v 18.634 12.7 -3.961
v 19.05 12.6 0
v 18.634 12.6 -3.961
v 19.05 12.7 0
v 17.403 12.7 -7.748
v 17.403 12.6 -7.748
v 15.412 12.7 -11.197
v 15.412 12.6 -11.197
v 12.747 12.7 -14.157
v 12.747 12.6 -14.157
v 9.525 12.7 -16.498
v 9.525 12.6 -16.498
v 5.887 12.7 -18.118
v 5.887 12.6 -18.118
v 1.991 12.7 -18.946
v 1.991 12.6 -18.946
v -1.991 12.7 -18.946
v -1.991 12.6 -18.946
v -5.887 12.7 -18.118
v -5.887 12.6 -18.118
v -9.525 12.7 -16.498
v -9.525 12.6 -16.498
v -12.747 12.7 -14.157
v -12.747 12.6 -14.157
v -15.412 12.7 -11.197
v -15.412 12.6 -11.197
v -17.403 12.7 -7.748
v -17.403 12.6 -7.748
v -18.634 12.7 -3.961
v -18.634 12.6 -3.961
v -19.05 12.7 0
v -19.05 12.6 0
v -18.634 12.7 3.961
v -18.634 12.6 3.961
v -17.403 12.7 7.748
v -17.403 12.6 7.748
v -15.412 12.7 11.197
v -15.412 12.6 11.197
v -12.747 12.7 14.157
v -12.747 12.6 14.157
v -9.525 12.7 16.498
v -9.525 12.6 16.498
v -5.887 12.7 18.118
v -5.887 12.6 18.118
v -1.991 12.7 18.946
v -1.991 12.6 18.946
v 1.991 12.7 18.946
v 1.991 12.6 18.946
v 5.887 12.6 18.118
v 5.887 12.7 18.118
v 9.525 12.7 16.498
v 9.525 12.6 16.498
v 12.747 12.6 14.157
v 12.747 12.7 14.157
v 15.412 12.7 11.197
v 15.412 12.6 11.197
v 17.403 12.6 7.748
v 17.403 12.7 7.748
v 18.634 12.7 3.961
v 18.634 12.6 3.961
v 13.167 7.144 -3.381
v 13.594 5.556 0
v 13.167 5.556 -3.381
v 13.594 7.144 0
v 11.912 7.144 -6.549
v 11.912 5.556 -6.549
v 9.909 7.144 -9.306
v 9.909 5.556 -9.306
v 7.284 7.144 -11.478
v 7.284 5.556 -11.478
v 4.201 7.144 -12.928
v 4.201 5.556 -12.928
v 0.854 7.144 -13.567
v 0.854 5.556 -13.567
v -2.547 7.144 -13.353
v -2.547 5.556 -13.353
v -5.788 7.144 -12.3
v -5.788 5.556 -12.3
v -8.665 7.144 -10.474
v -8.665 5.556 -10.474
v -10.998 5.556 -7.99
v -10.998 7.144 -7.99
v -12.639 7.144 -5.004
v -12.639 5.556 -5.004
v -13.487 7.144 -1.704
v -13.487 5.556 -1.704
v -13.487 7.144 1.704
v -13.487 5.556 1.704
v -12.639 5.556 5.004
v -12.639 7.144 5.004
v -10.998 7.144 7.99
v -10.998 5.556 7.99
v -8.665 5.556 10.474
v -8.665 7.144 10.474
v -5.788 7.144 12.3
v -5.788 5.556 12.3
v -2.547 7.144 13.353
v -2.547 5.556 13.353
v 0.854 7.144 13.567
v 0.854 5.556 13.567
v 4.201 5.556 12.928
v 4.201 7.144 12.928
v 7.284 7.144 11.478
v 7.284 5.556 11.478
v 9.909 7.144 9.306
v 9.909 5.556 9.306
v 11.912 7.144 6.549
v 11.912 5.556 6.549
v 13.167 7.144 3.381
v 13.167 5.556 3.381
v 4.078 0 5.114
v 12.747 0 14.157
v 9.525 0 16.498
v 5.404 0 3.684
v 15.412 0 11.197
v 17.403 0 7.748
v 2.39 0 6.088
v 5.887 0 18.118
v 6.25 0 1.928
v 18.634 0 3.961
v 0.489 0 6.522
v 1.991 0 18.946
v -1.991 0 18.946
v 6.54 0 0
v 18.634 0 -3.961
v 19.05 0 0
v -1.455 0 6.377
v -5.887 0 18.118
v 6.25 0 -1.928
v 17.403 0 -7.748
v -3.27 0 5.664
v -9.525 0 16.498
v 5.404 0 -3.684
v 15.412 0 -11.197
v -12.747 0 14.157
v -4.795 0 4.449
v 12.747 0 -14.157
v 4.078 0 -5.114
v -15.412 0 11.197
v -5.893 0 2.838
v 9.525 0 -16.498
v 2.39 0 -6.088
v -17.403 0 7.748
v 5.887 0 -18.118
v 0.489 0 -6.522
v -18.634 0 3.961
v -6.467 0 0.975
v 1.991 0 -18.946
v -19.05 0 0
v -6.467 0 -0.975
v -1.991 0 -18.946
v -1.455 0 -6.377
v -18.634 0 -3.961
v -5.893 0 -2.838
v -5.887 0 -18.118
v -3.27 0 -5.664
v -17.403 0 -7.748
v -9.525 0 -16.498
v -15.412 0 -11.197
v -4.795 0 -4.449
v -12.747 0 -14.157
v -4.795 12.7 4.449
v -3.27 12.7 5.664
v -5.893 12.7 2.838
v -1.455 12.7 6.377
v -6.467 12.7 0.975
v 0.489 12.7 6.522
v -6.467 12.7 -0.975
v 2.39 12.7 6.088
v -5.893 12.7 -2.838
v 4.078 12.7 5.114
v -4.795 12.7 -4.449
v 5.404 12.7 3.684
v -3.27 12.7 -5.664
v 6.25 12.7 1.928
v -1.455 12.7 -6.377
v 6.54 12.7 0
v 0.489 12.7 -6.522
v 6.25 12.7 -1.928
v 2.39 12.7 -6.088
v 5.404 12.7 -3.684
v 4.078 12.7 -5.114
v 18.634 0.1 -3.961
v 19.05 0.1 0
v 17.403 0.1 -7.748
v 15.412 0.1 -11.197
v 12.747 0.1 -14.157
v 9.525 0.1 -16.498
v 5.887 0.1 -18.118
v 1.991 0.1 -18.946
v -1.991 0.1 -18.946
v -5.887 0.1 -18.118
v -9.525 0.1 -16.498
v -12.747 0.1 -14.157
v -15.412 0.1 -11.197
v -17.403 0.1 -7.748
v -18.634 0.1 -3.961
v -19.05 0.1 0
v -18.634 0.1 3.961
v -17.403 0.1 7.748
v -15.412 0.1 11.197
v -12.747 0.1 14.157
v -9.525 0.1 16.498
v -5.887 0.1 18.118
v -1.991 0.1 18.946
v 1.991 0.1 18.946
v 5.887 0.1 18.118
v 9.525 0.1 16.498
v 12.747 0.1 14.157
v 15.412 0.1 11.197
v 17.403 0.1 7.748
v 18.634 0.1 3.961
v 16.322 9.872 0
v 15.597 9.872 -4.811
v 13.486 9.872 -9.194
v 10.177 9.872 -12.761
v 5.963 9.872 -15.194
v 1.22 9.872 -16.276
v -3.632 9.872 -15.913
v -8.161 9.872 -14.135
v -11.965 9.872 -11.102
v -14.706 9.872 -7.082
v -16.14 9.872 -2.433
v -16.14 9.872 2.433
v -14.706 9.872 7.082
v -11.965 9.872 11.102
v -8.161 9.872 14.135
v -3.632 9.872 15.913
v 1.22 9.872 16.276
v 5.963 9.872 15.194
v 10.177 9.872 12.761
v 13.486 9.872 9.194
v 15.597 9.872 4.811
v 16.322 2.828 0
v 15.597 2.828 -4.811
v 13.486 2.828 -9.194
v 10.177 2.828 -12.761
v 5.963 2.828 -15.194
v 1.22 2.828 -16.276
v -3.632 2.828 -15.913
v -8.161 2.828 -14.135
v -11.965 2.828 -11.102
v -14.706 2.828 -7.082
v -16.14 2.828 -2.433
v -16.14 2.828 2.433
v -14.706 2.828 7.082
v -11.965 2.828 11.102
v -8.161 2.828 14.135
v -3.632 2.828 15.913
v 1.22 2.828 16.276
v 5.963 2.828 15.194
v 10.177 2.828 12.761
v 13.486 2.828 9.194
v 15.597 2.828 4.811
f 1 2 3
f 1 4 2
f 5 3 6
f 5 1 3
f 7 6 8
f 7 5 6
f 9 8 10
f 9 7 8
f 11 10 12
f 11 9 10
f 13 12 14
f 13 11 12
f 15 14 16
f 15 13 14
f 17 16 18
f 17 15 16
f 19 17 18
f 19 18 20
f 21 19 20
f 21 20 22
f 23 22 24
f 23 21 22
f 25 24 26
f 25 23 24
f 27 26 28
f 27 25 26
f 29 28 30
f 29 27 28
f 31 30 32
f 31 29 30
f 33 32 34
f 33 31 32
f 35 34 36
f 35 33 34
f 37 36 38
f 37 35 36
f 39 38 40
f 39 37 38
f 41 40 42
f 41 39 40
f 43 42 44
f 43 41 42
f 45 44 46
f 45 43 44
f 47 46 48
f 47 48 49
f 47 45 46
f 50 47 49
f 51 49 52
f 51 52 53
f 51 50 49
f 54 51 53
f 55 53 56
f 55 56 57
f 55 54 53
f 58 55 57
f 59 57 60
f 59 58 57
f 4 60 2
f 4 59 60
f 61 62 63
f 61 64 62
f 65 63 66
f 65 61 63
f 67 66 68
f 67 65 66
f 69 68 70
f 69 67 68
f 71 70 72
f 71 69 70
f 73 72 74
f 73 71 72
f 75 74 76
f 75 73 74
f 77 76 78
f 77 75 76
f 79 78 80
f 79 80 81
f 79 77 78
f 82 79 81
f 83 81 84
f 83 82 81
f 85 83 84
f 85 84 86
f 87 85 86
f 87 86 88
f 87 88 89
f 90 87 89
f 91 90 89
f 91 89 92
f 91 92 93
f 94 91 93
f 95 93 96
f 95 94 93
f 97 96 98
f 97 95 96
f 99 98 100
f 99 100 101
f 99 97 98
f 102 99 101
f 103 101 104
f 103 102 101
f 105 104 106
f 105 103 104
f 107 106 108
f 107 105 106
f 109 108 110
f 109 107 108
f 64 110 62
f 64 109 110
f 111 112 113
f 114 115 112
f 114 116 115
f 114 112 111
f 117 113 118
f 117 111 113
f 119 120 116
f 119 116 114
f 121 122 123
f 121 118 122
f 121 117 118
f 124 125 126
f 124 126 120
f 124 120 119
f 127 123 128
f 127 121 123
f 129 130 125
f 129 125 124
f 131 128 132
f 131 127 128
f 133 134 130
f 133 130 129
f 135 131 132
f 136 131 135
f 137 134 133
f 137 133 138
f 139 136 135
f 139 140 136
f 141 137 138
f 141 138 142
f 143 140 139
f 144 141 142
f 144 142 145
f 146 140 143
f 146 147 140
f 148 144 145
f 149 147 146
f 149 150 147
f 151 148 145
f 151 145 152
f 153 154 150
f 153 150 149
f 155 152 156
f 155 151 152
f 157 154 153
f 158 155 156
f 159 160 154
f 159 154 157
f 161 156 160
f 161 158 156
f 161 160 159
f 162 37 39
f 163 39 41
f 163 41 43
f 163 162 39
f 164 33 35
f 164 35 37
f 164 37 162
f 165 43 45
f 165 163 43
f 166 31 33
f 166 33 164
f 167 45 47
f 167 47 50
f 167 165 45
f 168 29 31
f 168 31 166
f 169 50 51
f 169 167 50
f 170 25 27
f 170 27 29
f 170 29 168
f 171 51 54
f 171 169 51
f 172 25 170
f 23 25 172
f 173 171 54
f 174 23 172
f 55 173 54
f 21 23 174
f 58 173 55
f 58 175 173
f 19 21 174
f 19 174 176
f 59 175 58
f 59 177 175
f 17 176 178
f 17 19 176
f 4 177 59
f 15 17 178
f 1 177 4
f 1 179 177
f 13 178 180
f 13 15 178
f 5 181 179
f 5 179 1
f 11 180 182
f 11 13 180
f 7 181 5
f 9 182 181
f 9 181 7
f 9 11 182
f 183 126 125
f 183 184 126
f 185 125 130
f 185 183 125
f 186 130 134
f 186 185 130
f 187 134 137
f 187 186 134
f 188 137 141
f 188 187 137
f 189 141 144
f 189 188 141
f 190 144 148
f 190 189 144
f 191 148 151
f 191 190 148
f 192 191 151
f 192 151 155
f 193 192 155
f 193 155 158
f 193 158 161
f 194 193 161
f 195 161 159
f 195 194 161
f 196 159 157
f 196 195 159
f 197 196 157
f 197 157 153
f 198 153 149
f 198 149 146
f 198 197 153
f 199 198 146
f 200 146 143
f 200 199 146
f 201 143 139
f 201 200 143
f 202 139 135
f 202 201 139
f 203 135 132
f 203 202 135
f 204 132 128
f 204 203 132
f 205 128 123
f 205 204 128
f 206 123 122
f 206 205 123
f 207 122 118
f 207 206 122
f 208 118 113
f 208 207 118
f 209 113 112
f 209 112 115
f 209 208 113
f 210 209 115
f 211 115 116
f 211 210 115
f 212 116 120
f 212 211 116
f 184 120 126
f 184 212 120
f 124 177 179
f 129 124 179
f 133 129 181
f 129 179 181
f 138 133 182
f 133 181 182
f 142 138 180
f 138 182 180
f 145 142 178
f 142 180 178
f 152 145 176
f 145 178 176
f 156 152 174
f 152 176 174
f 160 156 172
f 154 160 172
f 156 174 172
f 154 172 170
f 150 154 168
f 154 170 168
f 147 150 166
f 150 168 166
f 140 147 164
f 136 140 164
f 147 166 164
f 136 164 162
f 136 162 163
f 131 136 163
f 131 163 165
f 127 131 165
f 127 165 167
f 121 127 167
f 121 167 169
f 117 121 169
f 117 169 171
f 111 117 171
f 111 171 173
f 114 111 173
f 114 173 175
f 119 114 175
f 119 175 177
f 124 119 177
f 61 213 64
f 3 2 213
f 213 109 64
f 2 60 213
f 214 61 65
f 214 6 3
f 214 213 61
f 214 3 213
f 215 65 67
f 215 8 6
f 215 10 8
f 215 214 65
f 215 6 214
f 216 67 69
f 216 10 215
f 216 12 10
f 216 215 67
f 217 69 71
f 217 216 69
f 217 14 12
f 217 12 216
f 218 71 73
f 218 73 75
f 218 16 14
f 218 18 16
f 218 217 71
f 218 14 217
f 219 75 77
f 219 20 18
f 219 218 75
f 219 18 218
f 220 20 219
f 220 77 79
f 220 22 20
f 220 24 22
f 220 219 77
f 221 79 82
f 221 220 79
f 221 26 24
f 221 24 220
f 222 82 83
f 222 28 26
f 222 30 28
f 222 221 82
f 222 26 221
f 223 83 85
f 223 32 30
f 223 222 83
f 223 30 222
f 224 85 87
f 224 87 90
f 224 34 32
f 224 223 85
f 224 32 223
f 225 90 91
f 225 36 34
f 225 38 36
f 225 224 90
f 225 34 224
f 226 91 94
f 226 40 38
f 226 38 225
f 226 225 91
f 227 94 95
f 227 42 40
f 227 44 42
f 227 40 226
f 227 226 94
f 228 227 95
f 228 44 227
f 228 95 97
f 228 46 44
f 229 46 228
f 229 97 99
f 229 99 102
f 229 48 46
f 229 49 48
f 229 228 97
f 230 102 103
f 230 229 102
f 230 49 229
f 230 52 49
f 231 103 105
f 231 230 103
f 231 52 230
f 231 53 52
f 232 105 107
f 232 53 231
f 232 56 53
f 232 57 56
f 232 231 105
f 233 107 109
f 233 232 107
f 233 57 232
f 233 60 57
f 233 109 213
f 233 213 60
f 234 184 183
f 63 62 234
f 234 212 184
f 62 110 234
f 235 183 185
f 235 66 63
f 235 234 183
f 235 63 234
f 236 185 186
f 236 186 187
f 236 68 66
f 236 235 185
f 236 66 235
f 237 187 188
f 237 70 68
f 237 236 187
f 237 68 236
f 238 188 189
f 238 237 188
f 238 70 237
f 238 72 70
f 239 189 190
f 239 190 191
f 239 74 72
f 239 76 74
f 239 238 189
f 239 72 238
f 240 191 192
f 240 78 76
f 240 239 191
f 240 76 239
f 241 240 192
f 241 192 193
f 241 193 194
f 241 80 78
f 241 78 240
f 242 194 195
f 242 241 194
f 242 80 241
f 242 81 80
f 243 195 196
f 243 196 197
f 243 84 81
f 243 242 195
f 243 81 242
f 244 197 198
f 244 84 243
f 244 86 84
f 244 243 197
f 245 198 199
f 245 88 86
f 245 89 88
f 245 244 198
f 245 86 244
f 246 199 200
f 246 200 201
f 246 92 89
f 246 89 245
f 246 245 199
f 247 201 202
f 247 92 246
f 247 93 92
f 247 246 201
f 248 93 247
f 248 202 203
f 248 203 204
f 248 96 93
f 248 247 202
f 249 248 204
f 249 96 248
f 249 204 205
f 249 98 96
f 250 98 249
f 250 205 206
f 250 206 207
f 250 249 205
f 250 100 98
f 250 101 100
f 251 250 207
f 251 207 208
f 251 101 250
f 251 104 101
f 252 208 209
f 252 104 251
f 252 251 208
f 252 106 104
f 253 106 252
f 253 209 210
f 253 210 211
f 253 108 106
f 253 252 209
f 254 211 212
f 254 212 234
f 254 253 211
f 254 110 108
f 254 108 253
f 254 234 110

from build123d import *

# Parameters (mm, degrees)
SKETCH7_R          = 6.5405
CUT_EXTRUDE2_DEPTH = 13.7


with BuildPart() as part:
    # Sketch2 → Revolve1 (revolve)
    with BuildSketch(Plane.XY):
        Polygon((0, 0), (19.05, 0), (19.05, 0.1), (13.59375, 5.55625), (13.59375, 7.14375), (19.05, 12.6), (19.05, 12.7), (0, 12.7), align=None)
    revolve(axis=Axis((0, 0, 0), (0, 1, 0)))

    # Sketch7 → Cut-Extrude2 (cut, through all)
    with BuildSketch(Plane(origin=(0, 12.7, 0), x_dir=(1, 0, 0), z_dir=(0, 1, 0))):
        Circle(SKETCH7_R)
    extrude(amount=-CUT_EXTRUDE2_DEPTH, mode=Mode.SUBTRACT)


solid = part.part
